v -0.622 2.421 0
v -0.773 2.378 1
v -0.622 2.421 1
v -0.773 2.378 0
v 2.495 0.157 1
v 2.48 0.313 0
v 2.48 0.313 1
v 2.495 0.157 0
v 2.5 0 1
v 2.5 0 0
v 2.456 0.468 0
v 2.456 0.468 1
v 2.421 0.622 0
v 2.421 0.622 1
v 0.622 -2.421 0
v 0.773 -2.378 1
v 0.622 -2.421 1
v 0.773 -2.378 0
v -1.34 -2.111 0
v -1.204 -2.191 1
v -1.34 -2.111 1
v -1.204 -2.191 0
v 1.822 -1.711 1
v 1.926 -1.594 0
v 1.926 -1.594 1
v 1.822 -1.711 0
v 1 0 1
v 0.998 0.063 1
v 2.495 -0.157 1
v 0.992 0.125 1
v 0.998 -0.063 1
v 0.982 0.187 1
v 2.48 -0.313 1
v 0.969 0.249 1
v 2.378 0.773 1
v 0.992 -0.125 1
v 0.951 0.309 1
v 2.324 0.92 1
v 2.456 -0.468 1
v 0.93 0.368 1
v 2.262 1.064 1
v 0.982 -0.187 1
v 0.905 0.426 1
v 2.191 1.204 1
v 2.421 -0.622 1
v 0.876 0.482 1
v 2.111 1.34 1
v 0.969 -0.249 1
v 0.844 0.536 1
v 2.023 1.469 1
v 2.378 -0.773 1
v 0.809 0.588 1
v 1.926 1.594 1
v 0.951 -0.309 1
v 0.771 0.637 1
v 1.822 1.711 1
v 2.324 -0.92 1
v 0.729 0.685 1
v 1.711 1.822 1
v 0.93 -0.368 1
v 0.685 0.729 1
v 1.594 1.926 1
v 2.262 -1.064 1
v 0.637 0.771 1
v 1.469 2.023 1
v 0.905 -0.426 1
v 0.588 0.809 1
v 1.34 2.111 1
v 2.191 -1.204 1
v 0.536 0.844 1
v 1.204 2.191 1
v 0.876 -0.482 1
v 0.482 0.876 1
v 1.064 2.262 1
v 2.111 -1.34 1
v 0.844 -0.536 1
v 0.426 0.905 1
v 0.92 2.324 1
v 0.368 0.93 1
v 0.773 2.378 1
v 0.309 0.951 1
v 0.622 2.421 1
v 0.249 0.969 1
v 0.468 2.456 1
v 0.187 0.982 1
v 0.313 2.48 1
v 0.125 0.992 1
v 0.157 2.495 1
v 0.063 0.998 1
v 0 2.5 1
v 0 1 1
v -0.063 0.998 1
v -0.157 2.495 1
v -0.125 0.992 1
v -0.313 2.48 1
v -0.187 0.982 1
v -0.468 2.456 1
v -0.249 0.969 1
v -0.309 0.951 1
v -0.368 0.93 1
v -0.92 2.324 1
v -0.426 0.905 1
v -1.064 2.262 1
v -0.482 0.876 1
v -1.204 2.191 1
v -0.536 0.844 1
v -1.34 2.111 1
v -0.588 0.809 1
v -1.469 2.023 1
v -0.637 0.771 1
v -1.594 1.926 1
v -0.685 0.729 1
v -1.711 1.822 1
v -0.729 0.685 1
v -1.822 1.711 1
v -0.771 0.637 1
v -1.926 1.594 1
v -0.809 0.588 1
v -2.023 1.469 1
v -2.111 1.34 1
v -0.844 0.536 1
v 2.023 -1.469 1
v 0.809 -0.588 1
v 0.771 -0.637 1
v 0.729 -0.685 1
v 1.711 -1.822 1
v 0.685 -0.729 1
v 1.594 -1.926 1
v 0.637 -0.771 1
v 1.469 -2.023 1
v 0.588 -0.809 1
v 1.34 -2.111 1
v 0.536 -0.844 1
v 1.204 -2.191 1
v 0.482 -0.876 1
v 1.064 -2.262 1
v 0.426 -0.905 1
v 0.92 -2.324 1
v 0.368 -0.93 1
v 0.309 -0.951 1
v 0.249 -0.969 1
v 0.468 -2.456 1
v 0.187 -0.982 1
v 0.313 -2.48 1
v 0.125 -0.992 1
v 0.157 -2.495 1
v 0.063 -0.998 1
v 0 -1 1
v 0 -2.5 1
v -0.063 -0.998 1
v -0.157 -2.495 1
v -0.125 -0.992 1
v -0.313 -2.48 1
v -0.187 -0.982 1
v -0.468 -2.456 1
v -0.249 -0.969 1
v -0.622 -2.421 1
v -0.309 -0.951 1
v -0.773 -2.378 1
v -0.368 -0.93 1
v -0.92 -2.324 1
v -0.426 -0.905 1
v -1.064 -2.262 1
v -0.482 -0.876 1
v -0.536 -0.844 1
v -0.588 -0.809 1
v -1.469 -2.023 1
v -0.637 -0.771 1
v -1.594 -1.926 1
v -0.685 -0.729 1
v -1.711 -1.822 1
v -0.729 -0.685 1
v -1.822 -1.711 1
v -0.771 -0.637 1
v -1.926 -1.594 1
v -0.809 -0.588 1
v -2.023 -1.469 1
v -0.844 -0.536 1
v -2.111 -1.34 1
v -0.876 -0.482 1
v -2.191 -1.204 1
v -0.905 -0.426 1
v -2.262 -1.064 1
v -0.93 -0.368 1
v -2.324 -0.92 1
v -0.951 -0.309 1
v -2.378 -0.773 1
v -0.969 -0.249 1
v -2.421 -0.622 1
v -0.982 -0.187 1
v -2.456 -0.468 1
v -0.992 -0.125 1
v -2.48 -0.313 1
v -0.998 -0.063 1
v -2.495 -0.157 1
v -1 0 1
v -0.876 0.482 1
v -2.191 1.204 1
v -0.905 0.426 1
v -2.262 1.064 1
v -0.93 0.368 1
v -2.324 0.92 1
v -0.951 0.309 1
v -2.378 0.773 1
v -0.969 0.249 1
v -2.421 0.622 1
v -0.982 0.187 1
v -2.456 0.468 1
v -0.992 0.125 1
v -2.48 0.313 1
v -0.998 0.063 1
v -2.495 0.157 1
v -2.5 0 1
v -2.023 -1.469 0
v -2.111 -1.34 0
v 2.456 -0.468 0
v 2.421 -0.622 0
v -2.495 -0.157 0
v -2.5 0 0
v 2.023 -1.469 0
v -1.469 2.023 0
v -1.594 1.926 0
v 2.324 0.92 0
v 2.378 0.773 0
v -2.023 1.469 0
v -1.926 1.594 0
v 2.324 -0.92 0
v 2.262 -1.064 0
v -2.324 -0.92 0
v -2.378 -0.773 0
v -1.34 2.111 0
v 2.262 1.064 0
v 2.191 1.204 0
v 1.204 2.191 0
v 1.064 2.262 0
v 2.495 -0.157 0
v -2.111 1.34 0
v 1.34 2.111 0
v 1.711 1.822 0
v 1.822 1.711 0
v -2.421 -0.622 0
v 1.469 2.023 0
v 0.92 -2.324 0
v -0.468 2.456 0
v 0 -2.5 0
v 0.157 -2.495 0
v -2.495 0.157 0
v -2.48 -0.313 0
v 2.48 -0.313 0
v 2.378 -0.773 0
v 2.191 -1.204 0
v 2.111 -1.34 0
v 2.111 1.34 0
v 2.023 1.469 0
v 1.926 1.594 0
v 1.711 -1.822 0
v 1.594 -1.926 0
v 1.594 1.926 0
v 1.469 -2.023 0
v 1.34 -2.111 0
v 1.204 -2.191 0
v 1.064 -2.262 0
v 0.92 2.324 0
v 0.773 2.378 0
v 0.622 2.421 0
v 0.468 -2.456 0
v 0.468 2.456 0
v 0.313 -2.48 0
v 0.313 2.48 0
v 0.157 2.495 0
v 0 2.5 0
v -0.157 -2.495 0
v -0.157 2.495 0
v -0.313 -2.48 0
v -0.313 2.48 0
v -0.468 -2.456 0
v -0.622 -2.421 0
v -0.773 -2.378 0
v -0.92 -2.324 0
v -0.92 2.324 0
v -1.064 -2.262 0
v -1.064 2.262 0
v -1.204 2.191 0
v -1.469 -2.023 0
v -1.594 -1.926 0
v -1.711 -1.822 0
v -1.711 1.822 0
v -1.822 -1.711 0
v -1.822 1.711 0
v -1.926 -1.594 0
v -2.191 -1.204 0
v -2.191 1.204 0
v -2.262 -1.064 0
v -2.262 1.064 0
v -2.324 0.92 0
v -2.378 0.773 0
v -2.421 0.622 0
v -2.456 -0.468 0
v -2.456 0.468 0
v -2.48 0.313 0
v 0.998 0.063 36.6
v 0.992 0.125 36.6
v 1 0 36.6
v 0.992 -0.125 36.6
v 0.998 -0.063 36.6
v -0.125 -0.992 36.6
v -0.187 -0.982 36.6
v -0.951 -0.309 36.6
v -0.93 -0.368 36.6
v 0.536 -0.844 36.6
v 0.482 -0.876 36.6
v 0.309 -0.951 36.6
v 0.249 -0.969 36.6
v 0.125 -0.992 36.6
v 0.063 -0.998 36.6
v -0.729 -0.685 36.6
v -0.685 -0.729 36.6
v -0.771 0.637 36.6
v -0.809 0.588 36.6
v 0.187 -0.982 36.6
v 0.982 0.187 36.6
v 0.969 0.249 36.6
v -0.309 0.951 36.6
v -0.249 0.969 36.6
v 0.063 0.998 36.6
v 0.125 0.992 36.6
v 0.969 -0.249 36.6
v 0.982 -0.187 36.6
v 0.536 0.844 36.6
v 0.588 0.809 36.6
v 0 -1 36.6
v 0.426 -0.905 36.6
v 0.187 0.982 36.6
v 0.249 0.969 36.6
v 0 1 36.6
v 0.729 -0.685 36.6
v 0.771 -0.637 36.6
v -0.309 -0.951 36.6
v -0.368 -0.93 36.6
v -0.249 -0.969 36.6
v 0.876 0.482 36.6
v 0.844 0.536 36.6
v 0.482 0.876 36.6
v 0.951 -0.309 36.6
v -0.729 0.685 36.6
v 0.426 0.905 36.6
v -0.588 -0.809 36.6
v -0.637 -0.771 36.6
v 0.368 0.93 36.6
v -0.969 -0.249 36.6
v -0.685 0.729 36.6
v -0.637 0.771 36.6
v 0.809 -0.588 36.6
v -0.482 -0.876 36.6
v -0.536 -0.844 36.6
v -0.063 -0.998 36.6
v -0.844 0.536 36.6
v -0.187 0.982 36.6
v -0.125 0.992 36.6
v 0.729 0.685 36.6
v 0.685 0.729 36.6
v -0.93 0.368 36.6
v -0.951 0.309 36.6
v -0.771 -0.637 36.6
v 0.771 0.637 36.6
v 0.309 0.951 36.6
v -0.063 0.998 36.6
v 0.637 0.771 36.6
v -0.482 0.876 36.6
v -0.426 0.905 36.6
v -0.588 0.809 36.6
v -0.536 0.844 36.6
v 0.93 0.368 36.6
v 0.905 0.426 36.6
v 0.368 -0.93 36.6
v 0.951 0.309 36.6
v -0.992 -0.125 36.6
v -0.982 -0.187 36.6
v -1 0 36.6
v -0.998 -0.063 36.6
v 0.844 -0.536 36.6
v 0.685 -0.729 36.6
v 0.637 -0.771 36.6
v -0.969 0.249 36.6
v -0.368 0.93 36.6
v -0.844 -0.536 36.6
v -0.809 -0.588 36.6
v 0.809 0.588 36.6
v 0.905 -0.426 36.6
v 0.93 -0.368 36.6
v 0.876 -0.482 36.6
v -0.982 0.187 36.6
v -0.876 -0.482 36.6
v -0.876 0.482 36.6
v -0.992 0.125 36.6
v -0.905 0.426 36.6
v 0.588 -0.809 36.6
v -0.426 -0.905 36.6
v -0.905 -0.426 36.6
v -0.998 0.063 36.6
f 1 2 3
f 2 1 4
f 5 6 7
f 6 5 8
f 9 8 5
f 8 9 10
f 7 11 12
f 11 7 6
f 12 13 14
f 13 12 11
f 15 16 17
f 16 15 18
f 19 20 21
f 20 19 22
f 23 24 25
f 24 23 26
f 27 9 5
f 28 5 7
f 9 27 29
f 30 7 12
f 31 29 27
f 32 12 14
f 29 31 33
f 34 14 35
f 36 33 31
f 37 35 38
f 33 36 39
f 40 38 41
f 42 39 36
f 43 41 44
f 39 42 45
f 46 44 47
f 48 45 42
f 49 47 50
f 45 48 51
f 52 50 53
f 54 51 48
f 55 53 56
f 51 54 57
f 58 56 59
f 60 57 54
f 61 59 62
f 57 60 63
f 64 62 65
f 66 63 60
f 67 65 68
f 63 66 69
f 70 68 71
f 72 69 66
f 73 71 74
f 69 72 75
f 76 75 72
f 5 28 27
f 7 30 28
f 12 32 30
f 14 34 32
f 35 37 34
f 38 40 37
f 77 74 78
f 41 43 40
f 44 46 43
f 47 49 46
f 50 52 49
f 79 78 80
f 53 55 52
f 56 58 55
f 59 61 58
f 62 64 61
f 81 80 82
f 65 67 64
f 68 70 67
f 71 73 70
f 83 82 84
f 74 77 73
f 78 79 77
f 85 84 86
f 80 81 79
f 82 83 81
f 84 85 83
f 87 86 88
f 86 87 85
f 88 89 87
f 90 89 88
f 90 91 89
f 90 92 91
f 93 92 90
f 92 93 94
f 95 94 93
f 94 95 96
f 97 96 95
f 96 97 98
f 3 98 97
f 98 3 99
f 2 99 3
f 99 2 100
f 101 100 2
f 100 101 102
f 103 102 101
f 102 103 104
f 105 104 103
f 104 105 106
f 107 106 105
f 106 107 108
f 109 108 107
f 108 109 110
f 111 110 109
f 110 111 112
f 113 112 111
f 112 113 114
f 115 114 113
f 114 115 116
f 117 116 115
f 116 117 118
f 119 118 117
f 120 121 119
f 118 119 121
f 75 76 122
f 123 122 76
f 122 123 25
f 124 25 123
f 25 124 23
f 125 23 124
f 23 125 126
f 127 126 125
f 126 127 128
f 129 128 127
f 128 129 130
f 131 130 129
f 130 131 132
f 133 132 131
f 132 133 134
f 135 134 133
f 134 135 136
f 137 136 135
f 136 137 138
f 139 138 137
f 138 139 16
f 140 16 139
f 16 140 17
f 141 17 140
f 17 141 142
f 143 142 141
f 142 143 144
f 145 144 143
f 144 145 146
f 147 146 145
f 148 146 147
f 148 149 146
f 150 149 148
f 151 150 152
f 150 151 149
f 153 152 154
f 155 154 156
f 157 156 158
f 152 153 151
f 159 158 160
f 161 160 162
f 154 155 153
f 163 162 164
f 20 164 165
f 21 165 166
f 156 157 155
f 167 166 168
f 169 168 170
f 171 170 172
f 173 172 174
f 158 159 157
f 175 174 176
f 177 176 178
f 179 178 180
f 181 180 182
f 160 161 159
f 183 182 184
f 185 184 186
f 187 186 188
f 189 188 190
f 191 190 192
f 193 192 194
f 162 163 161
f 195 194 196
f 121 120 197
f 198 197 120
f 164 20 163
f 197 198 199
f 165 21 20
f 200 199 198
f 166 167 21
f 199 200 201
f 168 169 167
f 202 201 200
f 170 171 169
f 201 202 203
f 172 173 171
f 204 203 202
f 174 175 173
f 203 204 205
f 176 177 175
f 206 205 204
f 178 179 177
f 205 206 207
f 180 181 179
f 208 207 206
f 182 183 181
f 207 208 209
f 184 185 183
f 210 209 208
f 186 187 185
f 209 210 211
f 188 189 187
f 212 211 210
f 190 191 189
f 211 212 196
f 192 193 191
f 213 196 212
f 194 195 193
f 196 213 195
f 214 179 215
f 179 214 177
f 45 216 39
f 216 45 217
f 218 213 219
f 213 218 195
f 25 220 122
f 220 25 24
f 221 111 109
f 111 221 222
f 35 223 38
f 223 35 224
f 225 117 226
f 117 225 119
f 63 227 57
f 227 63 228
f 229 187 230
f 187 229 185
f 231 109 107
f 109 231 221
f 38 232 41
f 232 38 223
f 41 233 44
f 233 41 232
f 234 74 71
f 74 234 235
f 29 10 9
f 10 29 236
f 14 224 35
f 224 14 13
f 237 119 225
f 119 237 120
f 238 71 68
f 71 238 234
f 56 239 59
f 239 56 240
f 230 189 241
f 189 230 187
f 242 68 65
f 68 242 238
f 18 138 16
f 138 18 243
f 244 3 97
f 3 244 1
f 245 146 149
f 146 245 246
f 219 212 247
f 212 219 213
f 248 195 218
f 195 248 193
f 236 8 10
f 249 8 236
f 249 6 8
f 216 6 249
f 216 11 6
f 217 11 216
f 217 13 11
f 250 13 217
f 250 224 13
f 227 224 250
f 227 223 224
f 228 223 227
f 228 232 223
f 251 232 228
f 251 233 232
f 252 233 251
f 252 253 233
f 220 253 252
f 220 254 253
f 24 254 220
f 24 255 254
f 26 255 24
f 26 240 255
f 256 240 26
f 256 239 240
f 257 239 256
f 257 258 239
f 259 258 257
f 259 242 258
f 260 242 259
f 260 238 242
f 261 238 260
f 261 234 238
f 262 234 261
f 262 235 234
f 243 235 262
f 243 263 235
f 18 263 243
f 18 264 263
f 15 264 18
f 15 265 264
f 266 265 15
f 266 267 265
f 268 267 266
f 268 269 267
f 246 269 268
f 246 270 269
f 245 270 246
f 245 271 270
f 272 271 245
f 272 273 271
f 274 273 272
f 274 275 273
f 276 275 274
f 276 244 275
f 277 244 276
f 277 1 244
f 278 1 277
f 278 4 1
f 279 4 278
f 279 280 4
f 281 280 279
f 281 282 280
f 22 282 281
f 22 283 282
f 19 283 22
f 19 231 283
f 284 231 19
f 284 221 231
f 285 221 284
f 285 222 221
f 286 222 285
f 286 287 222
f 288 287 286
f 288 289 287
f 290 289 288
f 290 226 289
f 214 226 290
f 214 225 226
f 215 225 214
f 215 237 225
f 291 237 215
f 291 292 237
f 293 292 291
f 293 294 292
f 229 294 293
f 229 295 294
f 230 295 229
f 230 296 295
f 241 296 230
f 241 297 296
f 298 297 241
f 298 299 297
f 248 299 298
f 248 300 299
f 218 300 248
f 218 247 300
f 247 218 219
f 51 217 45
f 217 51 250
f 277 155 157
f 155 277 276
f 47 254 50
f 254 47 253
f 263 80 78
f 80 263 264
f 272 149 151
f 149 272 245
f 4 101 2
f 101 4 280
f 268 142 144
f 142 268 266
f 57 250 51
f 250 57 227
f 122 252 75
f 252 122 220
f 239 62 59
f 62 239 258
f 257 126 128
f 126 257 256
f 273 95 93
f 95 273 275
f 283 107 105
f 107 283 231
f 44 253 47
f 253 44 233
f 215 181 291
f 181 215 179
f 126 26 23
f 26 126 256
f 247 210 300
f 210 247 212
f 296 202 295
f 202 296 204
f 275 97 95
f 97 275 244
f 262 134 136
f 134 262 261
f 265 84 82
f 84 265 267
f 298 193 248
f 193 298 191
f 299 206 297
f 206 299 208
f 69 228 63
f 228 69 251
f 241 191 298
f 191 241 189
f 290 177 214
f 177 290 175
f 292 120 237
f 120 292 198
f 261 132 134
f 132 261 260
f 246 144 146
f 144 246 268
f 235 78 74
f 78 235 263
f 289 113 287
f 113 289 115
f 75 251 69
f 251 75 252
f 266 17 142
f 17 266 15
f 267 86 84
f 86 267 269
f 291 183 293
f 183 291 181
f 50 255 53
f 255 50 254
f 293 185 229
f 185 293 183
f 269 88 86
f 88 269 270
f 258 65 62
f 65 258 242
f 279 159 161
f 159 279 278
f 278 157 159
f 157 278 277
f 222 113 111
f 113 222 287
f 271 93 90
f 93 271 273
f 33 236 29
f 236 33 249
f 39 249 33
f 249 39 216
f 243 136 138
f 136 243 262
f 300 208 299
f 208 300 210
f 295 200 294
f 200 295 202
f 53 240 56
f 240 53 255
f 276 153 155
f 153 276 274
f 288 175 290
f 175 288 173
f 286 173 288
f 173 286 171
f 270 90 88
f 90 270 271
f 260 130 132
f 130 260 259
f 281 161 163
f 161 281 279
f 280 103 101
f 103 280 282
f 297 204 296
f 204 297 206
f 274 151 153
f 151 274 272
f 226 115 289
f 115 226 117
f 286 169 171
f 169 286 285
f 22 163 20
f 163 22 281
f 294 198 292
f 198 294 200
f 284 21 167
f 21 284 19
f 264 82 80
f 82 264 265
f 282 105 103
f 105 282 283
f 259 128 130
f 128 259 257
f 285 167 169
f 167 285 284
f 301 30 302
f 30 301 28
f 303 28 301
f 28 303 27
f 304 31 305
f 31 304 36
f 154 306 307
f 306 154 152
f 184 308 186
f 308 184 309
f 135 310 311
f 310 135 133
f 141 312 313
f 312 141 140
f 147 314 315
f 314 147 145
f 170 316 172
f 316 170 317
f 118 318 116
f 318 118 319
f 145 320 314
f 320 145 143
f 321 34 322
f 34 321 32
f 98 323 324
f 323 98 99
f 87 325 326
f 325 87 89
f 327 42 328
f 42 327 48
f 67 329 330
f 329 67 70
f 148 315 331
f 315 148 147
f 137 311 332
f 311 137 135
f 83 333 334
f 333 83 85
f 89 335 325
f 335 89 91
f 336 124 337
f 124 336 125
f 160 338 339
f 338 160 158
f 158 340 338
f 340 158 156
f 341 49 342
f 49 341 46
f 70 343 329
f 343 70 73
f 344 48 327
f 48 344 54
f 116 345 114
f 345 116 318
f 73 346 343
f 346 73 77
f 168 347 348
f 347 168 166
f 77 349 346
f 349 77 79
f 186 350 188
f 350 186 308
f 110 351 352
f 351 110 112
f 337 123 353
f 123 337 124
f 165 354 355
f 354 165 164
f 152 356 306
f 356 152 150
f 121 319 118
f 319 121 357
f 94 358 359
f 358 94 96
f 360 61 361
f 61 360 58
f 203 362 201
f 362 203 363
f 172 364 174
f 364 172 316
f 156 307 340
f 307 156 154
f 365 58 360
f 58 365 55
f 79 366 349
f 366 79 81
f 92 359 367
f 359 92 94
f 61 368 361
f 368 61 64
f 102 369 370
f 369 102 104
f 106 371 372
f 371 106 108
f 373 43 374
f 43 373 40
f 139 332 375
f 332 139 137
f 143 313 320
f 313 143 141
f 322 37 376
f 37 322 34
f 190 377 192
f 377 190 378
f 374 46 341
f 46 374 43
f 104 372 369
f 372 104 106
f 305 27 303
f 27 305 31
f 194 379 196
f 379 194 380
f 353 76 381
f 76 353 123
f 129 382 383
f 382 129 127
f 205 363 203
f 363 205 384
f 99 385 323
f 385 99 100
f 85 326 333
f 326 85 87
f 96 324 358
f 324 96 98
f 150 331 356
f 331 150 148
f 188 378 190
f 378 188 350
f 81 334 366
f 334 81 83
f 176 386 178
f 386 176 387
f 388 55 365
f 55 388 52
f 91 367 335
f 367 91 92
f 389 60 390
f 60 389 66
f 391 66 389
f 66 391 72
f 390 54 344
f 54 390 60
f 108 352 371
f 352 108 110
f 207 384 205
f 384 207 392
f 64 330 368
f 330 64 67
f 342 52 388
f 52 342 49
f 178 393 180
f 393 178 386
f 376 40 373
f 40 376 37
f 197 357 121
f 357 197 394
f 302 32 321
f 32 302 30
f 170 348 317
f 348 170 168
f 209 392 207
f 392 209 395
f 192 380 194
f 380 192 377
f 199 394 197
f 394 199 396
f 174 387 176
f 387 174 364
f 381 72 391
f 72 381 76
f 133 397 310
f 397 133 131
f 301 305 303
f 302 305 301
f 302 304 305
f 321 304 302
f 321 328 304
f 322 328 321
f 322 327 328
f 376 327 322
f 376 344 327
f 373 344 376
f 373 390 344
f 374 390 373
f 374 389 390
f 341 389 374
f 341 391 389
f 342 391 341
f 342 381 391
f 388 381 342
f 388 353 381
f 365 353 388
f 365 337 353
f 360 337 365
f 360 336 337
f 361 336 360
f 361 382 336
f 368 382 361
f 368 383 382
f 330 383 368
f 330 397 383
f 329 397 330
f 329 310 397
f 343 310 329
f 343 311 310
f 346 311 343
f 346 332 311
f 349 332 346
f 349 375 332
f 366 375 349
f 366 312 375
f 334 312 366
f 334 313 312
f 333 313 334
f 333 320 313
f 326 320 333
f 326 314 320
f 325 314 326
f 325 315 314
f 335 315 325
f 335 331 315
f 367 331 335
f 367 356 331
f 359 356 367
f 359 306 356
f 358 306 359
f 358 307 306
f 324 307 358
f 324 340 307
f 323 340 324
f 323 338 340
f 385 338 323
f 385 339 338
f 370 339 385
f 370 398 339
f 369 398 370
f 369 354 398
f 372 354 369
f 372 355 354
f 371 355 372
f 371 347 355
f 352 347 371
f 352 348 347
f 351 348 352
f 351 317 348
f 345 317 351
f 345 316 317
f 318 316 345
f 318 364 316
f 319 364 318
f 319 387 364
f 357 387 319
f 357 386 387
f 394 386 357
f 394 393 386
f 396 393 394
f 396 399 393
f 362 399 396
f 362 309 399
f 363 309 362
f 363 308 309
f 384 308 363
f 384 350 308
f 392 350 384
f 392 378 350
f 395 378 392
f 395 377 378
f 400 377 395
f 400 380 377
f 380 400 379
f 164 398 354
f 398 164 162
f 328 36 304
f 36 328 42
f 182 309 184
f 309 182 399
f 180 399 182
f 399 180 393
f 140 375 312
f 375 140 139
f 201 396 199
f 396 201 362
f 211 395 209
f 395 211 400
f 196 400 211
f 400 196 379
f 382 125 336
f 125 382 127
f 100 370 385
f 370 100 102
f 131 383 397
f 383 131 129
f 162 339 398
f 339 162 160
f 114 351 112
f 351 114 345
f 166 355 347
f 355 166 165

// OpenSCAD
/* 
 * This file is part of rpi-spectrophotometer (https://github.com/zanar/rpi-spectrophotometer).
 * Copyright (c) 2018 zanar.
 * 
 * This program is free software: you can redistribute it and/or modify  
 * it under the terms of the GNU General Public License as published by  
 * the Free Software Foundation, version 3.
 *
 * This program is distributed in the hope that it will be useful, but 
 * WITHOUT ANY WARRANTY; without even the implied warranty of 
 * MERCHANTABILITY or FITNESS FOR A PARTICULAR PURPOSE. See the GNU 
 * General Public License for more details.
 *
 * You should have received a copy of the GNU General Public License 
 * along with this program. If not, see <http://www.gnu.org/licenses/>.
*/

module axis(alpha=1) {
	$fn=100;

	color("red", alpha) {
		cylinder(r=2.5, h=1);
		cylinder(r=1, h=4*5+3*5.2+1);
	}
}

axis();
